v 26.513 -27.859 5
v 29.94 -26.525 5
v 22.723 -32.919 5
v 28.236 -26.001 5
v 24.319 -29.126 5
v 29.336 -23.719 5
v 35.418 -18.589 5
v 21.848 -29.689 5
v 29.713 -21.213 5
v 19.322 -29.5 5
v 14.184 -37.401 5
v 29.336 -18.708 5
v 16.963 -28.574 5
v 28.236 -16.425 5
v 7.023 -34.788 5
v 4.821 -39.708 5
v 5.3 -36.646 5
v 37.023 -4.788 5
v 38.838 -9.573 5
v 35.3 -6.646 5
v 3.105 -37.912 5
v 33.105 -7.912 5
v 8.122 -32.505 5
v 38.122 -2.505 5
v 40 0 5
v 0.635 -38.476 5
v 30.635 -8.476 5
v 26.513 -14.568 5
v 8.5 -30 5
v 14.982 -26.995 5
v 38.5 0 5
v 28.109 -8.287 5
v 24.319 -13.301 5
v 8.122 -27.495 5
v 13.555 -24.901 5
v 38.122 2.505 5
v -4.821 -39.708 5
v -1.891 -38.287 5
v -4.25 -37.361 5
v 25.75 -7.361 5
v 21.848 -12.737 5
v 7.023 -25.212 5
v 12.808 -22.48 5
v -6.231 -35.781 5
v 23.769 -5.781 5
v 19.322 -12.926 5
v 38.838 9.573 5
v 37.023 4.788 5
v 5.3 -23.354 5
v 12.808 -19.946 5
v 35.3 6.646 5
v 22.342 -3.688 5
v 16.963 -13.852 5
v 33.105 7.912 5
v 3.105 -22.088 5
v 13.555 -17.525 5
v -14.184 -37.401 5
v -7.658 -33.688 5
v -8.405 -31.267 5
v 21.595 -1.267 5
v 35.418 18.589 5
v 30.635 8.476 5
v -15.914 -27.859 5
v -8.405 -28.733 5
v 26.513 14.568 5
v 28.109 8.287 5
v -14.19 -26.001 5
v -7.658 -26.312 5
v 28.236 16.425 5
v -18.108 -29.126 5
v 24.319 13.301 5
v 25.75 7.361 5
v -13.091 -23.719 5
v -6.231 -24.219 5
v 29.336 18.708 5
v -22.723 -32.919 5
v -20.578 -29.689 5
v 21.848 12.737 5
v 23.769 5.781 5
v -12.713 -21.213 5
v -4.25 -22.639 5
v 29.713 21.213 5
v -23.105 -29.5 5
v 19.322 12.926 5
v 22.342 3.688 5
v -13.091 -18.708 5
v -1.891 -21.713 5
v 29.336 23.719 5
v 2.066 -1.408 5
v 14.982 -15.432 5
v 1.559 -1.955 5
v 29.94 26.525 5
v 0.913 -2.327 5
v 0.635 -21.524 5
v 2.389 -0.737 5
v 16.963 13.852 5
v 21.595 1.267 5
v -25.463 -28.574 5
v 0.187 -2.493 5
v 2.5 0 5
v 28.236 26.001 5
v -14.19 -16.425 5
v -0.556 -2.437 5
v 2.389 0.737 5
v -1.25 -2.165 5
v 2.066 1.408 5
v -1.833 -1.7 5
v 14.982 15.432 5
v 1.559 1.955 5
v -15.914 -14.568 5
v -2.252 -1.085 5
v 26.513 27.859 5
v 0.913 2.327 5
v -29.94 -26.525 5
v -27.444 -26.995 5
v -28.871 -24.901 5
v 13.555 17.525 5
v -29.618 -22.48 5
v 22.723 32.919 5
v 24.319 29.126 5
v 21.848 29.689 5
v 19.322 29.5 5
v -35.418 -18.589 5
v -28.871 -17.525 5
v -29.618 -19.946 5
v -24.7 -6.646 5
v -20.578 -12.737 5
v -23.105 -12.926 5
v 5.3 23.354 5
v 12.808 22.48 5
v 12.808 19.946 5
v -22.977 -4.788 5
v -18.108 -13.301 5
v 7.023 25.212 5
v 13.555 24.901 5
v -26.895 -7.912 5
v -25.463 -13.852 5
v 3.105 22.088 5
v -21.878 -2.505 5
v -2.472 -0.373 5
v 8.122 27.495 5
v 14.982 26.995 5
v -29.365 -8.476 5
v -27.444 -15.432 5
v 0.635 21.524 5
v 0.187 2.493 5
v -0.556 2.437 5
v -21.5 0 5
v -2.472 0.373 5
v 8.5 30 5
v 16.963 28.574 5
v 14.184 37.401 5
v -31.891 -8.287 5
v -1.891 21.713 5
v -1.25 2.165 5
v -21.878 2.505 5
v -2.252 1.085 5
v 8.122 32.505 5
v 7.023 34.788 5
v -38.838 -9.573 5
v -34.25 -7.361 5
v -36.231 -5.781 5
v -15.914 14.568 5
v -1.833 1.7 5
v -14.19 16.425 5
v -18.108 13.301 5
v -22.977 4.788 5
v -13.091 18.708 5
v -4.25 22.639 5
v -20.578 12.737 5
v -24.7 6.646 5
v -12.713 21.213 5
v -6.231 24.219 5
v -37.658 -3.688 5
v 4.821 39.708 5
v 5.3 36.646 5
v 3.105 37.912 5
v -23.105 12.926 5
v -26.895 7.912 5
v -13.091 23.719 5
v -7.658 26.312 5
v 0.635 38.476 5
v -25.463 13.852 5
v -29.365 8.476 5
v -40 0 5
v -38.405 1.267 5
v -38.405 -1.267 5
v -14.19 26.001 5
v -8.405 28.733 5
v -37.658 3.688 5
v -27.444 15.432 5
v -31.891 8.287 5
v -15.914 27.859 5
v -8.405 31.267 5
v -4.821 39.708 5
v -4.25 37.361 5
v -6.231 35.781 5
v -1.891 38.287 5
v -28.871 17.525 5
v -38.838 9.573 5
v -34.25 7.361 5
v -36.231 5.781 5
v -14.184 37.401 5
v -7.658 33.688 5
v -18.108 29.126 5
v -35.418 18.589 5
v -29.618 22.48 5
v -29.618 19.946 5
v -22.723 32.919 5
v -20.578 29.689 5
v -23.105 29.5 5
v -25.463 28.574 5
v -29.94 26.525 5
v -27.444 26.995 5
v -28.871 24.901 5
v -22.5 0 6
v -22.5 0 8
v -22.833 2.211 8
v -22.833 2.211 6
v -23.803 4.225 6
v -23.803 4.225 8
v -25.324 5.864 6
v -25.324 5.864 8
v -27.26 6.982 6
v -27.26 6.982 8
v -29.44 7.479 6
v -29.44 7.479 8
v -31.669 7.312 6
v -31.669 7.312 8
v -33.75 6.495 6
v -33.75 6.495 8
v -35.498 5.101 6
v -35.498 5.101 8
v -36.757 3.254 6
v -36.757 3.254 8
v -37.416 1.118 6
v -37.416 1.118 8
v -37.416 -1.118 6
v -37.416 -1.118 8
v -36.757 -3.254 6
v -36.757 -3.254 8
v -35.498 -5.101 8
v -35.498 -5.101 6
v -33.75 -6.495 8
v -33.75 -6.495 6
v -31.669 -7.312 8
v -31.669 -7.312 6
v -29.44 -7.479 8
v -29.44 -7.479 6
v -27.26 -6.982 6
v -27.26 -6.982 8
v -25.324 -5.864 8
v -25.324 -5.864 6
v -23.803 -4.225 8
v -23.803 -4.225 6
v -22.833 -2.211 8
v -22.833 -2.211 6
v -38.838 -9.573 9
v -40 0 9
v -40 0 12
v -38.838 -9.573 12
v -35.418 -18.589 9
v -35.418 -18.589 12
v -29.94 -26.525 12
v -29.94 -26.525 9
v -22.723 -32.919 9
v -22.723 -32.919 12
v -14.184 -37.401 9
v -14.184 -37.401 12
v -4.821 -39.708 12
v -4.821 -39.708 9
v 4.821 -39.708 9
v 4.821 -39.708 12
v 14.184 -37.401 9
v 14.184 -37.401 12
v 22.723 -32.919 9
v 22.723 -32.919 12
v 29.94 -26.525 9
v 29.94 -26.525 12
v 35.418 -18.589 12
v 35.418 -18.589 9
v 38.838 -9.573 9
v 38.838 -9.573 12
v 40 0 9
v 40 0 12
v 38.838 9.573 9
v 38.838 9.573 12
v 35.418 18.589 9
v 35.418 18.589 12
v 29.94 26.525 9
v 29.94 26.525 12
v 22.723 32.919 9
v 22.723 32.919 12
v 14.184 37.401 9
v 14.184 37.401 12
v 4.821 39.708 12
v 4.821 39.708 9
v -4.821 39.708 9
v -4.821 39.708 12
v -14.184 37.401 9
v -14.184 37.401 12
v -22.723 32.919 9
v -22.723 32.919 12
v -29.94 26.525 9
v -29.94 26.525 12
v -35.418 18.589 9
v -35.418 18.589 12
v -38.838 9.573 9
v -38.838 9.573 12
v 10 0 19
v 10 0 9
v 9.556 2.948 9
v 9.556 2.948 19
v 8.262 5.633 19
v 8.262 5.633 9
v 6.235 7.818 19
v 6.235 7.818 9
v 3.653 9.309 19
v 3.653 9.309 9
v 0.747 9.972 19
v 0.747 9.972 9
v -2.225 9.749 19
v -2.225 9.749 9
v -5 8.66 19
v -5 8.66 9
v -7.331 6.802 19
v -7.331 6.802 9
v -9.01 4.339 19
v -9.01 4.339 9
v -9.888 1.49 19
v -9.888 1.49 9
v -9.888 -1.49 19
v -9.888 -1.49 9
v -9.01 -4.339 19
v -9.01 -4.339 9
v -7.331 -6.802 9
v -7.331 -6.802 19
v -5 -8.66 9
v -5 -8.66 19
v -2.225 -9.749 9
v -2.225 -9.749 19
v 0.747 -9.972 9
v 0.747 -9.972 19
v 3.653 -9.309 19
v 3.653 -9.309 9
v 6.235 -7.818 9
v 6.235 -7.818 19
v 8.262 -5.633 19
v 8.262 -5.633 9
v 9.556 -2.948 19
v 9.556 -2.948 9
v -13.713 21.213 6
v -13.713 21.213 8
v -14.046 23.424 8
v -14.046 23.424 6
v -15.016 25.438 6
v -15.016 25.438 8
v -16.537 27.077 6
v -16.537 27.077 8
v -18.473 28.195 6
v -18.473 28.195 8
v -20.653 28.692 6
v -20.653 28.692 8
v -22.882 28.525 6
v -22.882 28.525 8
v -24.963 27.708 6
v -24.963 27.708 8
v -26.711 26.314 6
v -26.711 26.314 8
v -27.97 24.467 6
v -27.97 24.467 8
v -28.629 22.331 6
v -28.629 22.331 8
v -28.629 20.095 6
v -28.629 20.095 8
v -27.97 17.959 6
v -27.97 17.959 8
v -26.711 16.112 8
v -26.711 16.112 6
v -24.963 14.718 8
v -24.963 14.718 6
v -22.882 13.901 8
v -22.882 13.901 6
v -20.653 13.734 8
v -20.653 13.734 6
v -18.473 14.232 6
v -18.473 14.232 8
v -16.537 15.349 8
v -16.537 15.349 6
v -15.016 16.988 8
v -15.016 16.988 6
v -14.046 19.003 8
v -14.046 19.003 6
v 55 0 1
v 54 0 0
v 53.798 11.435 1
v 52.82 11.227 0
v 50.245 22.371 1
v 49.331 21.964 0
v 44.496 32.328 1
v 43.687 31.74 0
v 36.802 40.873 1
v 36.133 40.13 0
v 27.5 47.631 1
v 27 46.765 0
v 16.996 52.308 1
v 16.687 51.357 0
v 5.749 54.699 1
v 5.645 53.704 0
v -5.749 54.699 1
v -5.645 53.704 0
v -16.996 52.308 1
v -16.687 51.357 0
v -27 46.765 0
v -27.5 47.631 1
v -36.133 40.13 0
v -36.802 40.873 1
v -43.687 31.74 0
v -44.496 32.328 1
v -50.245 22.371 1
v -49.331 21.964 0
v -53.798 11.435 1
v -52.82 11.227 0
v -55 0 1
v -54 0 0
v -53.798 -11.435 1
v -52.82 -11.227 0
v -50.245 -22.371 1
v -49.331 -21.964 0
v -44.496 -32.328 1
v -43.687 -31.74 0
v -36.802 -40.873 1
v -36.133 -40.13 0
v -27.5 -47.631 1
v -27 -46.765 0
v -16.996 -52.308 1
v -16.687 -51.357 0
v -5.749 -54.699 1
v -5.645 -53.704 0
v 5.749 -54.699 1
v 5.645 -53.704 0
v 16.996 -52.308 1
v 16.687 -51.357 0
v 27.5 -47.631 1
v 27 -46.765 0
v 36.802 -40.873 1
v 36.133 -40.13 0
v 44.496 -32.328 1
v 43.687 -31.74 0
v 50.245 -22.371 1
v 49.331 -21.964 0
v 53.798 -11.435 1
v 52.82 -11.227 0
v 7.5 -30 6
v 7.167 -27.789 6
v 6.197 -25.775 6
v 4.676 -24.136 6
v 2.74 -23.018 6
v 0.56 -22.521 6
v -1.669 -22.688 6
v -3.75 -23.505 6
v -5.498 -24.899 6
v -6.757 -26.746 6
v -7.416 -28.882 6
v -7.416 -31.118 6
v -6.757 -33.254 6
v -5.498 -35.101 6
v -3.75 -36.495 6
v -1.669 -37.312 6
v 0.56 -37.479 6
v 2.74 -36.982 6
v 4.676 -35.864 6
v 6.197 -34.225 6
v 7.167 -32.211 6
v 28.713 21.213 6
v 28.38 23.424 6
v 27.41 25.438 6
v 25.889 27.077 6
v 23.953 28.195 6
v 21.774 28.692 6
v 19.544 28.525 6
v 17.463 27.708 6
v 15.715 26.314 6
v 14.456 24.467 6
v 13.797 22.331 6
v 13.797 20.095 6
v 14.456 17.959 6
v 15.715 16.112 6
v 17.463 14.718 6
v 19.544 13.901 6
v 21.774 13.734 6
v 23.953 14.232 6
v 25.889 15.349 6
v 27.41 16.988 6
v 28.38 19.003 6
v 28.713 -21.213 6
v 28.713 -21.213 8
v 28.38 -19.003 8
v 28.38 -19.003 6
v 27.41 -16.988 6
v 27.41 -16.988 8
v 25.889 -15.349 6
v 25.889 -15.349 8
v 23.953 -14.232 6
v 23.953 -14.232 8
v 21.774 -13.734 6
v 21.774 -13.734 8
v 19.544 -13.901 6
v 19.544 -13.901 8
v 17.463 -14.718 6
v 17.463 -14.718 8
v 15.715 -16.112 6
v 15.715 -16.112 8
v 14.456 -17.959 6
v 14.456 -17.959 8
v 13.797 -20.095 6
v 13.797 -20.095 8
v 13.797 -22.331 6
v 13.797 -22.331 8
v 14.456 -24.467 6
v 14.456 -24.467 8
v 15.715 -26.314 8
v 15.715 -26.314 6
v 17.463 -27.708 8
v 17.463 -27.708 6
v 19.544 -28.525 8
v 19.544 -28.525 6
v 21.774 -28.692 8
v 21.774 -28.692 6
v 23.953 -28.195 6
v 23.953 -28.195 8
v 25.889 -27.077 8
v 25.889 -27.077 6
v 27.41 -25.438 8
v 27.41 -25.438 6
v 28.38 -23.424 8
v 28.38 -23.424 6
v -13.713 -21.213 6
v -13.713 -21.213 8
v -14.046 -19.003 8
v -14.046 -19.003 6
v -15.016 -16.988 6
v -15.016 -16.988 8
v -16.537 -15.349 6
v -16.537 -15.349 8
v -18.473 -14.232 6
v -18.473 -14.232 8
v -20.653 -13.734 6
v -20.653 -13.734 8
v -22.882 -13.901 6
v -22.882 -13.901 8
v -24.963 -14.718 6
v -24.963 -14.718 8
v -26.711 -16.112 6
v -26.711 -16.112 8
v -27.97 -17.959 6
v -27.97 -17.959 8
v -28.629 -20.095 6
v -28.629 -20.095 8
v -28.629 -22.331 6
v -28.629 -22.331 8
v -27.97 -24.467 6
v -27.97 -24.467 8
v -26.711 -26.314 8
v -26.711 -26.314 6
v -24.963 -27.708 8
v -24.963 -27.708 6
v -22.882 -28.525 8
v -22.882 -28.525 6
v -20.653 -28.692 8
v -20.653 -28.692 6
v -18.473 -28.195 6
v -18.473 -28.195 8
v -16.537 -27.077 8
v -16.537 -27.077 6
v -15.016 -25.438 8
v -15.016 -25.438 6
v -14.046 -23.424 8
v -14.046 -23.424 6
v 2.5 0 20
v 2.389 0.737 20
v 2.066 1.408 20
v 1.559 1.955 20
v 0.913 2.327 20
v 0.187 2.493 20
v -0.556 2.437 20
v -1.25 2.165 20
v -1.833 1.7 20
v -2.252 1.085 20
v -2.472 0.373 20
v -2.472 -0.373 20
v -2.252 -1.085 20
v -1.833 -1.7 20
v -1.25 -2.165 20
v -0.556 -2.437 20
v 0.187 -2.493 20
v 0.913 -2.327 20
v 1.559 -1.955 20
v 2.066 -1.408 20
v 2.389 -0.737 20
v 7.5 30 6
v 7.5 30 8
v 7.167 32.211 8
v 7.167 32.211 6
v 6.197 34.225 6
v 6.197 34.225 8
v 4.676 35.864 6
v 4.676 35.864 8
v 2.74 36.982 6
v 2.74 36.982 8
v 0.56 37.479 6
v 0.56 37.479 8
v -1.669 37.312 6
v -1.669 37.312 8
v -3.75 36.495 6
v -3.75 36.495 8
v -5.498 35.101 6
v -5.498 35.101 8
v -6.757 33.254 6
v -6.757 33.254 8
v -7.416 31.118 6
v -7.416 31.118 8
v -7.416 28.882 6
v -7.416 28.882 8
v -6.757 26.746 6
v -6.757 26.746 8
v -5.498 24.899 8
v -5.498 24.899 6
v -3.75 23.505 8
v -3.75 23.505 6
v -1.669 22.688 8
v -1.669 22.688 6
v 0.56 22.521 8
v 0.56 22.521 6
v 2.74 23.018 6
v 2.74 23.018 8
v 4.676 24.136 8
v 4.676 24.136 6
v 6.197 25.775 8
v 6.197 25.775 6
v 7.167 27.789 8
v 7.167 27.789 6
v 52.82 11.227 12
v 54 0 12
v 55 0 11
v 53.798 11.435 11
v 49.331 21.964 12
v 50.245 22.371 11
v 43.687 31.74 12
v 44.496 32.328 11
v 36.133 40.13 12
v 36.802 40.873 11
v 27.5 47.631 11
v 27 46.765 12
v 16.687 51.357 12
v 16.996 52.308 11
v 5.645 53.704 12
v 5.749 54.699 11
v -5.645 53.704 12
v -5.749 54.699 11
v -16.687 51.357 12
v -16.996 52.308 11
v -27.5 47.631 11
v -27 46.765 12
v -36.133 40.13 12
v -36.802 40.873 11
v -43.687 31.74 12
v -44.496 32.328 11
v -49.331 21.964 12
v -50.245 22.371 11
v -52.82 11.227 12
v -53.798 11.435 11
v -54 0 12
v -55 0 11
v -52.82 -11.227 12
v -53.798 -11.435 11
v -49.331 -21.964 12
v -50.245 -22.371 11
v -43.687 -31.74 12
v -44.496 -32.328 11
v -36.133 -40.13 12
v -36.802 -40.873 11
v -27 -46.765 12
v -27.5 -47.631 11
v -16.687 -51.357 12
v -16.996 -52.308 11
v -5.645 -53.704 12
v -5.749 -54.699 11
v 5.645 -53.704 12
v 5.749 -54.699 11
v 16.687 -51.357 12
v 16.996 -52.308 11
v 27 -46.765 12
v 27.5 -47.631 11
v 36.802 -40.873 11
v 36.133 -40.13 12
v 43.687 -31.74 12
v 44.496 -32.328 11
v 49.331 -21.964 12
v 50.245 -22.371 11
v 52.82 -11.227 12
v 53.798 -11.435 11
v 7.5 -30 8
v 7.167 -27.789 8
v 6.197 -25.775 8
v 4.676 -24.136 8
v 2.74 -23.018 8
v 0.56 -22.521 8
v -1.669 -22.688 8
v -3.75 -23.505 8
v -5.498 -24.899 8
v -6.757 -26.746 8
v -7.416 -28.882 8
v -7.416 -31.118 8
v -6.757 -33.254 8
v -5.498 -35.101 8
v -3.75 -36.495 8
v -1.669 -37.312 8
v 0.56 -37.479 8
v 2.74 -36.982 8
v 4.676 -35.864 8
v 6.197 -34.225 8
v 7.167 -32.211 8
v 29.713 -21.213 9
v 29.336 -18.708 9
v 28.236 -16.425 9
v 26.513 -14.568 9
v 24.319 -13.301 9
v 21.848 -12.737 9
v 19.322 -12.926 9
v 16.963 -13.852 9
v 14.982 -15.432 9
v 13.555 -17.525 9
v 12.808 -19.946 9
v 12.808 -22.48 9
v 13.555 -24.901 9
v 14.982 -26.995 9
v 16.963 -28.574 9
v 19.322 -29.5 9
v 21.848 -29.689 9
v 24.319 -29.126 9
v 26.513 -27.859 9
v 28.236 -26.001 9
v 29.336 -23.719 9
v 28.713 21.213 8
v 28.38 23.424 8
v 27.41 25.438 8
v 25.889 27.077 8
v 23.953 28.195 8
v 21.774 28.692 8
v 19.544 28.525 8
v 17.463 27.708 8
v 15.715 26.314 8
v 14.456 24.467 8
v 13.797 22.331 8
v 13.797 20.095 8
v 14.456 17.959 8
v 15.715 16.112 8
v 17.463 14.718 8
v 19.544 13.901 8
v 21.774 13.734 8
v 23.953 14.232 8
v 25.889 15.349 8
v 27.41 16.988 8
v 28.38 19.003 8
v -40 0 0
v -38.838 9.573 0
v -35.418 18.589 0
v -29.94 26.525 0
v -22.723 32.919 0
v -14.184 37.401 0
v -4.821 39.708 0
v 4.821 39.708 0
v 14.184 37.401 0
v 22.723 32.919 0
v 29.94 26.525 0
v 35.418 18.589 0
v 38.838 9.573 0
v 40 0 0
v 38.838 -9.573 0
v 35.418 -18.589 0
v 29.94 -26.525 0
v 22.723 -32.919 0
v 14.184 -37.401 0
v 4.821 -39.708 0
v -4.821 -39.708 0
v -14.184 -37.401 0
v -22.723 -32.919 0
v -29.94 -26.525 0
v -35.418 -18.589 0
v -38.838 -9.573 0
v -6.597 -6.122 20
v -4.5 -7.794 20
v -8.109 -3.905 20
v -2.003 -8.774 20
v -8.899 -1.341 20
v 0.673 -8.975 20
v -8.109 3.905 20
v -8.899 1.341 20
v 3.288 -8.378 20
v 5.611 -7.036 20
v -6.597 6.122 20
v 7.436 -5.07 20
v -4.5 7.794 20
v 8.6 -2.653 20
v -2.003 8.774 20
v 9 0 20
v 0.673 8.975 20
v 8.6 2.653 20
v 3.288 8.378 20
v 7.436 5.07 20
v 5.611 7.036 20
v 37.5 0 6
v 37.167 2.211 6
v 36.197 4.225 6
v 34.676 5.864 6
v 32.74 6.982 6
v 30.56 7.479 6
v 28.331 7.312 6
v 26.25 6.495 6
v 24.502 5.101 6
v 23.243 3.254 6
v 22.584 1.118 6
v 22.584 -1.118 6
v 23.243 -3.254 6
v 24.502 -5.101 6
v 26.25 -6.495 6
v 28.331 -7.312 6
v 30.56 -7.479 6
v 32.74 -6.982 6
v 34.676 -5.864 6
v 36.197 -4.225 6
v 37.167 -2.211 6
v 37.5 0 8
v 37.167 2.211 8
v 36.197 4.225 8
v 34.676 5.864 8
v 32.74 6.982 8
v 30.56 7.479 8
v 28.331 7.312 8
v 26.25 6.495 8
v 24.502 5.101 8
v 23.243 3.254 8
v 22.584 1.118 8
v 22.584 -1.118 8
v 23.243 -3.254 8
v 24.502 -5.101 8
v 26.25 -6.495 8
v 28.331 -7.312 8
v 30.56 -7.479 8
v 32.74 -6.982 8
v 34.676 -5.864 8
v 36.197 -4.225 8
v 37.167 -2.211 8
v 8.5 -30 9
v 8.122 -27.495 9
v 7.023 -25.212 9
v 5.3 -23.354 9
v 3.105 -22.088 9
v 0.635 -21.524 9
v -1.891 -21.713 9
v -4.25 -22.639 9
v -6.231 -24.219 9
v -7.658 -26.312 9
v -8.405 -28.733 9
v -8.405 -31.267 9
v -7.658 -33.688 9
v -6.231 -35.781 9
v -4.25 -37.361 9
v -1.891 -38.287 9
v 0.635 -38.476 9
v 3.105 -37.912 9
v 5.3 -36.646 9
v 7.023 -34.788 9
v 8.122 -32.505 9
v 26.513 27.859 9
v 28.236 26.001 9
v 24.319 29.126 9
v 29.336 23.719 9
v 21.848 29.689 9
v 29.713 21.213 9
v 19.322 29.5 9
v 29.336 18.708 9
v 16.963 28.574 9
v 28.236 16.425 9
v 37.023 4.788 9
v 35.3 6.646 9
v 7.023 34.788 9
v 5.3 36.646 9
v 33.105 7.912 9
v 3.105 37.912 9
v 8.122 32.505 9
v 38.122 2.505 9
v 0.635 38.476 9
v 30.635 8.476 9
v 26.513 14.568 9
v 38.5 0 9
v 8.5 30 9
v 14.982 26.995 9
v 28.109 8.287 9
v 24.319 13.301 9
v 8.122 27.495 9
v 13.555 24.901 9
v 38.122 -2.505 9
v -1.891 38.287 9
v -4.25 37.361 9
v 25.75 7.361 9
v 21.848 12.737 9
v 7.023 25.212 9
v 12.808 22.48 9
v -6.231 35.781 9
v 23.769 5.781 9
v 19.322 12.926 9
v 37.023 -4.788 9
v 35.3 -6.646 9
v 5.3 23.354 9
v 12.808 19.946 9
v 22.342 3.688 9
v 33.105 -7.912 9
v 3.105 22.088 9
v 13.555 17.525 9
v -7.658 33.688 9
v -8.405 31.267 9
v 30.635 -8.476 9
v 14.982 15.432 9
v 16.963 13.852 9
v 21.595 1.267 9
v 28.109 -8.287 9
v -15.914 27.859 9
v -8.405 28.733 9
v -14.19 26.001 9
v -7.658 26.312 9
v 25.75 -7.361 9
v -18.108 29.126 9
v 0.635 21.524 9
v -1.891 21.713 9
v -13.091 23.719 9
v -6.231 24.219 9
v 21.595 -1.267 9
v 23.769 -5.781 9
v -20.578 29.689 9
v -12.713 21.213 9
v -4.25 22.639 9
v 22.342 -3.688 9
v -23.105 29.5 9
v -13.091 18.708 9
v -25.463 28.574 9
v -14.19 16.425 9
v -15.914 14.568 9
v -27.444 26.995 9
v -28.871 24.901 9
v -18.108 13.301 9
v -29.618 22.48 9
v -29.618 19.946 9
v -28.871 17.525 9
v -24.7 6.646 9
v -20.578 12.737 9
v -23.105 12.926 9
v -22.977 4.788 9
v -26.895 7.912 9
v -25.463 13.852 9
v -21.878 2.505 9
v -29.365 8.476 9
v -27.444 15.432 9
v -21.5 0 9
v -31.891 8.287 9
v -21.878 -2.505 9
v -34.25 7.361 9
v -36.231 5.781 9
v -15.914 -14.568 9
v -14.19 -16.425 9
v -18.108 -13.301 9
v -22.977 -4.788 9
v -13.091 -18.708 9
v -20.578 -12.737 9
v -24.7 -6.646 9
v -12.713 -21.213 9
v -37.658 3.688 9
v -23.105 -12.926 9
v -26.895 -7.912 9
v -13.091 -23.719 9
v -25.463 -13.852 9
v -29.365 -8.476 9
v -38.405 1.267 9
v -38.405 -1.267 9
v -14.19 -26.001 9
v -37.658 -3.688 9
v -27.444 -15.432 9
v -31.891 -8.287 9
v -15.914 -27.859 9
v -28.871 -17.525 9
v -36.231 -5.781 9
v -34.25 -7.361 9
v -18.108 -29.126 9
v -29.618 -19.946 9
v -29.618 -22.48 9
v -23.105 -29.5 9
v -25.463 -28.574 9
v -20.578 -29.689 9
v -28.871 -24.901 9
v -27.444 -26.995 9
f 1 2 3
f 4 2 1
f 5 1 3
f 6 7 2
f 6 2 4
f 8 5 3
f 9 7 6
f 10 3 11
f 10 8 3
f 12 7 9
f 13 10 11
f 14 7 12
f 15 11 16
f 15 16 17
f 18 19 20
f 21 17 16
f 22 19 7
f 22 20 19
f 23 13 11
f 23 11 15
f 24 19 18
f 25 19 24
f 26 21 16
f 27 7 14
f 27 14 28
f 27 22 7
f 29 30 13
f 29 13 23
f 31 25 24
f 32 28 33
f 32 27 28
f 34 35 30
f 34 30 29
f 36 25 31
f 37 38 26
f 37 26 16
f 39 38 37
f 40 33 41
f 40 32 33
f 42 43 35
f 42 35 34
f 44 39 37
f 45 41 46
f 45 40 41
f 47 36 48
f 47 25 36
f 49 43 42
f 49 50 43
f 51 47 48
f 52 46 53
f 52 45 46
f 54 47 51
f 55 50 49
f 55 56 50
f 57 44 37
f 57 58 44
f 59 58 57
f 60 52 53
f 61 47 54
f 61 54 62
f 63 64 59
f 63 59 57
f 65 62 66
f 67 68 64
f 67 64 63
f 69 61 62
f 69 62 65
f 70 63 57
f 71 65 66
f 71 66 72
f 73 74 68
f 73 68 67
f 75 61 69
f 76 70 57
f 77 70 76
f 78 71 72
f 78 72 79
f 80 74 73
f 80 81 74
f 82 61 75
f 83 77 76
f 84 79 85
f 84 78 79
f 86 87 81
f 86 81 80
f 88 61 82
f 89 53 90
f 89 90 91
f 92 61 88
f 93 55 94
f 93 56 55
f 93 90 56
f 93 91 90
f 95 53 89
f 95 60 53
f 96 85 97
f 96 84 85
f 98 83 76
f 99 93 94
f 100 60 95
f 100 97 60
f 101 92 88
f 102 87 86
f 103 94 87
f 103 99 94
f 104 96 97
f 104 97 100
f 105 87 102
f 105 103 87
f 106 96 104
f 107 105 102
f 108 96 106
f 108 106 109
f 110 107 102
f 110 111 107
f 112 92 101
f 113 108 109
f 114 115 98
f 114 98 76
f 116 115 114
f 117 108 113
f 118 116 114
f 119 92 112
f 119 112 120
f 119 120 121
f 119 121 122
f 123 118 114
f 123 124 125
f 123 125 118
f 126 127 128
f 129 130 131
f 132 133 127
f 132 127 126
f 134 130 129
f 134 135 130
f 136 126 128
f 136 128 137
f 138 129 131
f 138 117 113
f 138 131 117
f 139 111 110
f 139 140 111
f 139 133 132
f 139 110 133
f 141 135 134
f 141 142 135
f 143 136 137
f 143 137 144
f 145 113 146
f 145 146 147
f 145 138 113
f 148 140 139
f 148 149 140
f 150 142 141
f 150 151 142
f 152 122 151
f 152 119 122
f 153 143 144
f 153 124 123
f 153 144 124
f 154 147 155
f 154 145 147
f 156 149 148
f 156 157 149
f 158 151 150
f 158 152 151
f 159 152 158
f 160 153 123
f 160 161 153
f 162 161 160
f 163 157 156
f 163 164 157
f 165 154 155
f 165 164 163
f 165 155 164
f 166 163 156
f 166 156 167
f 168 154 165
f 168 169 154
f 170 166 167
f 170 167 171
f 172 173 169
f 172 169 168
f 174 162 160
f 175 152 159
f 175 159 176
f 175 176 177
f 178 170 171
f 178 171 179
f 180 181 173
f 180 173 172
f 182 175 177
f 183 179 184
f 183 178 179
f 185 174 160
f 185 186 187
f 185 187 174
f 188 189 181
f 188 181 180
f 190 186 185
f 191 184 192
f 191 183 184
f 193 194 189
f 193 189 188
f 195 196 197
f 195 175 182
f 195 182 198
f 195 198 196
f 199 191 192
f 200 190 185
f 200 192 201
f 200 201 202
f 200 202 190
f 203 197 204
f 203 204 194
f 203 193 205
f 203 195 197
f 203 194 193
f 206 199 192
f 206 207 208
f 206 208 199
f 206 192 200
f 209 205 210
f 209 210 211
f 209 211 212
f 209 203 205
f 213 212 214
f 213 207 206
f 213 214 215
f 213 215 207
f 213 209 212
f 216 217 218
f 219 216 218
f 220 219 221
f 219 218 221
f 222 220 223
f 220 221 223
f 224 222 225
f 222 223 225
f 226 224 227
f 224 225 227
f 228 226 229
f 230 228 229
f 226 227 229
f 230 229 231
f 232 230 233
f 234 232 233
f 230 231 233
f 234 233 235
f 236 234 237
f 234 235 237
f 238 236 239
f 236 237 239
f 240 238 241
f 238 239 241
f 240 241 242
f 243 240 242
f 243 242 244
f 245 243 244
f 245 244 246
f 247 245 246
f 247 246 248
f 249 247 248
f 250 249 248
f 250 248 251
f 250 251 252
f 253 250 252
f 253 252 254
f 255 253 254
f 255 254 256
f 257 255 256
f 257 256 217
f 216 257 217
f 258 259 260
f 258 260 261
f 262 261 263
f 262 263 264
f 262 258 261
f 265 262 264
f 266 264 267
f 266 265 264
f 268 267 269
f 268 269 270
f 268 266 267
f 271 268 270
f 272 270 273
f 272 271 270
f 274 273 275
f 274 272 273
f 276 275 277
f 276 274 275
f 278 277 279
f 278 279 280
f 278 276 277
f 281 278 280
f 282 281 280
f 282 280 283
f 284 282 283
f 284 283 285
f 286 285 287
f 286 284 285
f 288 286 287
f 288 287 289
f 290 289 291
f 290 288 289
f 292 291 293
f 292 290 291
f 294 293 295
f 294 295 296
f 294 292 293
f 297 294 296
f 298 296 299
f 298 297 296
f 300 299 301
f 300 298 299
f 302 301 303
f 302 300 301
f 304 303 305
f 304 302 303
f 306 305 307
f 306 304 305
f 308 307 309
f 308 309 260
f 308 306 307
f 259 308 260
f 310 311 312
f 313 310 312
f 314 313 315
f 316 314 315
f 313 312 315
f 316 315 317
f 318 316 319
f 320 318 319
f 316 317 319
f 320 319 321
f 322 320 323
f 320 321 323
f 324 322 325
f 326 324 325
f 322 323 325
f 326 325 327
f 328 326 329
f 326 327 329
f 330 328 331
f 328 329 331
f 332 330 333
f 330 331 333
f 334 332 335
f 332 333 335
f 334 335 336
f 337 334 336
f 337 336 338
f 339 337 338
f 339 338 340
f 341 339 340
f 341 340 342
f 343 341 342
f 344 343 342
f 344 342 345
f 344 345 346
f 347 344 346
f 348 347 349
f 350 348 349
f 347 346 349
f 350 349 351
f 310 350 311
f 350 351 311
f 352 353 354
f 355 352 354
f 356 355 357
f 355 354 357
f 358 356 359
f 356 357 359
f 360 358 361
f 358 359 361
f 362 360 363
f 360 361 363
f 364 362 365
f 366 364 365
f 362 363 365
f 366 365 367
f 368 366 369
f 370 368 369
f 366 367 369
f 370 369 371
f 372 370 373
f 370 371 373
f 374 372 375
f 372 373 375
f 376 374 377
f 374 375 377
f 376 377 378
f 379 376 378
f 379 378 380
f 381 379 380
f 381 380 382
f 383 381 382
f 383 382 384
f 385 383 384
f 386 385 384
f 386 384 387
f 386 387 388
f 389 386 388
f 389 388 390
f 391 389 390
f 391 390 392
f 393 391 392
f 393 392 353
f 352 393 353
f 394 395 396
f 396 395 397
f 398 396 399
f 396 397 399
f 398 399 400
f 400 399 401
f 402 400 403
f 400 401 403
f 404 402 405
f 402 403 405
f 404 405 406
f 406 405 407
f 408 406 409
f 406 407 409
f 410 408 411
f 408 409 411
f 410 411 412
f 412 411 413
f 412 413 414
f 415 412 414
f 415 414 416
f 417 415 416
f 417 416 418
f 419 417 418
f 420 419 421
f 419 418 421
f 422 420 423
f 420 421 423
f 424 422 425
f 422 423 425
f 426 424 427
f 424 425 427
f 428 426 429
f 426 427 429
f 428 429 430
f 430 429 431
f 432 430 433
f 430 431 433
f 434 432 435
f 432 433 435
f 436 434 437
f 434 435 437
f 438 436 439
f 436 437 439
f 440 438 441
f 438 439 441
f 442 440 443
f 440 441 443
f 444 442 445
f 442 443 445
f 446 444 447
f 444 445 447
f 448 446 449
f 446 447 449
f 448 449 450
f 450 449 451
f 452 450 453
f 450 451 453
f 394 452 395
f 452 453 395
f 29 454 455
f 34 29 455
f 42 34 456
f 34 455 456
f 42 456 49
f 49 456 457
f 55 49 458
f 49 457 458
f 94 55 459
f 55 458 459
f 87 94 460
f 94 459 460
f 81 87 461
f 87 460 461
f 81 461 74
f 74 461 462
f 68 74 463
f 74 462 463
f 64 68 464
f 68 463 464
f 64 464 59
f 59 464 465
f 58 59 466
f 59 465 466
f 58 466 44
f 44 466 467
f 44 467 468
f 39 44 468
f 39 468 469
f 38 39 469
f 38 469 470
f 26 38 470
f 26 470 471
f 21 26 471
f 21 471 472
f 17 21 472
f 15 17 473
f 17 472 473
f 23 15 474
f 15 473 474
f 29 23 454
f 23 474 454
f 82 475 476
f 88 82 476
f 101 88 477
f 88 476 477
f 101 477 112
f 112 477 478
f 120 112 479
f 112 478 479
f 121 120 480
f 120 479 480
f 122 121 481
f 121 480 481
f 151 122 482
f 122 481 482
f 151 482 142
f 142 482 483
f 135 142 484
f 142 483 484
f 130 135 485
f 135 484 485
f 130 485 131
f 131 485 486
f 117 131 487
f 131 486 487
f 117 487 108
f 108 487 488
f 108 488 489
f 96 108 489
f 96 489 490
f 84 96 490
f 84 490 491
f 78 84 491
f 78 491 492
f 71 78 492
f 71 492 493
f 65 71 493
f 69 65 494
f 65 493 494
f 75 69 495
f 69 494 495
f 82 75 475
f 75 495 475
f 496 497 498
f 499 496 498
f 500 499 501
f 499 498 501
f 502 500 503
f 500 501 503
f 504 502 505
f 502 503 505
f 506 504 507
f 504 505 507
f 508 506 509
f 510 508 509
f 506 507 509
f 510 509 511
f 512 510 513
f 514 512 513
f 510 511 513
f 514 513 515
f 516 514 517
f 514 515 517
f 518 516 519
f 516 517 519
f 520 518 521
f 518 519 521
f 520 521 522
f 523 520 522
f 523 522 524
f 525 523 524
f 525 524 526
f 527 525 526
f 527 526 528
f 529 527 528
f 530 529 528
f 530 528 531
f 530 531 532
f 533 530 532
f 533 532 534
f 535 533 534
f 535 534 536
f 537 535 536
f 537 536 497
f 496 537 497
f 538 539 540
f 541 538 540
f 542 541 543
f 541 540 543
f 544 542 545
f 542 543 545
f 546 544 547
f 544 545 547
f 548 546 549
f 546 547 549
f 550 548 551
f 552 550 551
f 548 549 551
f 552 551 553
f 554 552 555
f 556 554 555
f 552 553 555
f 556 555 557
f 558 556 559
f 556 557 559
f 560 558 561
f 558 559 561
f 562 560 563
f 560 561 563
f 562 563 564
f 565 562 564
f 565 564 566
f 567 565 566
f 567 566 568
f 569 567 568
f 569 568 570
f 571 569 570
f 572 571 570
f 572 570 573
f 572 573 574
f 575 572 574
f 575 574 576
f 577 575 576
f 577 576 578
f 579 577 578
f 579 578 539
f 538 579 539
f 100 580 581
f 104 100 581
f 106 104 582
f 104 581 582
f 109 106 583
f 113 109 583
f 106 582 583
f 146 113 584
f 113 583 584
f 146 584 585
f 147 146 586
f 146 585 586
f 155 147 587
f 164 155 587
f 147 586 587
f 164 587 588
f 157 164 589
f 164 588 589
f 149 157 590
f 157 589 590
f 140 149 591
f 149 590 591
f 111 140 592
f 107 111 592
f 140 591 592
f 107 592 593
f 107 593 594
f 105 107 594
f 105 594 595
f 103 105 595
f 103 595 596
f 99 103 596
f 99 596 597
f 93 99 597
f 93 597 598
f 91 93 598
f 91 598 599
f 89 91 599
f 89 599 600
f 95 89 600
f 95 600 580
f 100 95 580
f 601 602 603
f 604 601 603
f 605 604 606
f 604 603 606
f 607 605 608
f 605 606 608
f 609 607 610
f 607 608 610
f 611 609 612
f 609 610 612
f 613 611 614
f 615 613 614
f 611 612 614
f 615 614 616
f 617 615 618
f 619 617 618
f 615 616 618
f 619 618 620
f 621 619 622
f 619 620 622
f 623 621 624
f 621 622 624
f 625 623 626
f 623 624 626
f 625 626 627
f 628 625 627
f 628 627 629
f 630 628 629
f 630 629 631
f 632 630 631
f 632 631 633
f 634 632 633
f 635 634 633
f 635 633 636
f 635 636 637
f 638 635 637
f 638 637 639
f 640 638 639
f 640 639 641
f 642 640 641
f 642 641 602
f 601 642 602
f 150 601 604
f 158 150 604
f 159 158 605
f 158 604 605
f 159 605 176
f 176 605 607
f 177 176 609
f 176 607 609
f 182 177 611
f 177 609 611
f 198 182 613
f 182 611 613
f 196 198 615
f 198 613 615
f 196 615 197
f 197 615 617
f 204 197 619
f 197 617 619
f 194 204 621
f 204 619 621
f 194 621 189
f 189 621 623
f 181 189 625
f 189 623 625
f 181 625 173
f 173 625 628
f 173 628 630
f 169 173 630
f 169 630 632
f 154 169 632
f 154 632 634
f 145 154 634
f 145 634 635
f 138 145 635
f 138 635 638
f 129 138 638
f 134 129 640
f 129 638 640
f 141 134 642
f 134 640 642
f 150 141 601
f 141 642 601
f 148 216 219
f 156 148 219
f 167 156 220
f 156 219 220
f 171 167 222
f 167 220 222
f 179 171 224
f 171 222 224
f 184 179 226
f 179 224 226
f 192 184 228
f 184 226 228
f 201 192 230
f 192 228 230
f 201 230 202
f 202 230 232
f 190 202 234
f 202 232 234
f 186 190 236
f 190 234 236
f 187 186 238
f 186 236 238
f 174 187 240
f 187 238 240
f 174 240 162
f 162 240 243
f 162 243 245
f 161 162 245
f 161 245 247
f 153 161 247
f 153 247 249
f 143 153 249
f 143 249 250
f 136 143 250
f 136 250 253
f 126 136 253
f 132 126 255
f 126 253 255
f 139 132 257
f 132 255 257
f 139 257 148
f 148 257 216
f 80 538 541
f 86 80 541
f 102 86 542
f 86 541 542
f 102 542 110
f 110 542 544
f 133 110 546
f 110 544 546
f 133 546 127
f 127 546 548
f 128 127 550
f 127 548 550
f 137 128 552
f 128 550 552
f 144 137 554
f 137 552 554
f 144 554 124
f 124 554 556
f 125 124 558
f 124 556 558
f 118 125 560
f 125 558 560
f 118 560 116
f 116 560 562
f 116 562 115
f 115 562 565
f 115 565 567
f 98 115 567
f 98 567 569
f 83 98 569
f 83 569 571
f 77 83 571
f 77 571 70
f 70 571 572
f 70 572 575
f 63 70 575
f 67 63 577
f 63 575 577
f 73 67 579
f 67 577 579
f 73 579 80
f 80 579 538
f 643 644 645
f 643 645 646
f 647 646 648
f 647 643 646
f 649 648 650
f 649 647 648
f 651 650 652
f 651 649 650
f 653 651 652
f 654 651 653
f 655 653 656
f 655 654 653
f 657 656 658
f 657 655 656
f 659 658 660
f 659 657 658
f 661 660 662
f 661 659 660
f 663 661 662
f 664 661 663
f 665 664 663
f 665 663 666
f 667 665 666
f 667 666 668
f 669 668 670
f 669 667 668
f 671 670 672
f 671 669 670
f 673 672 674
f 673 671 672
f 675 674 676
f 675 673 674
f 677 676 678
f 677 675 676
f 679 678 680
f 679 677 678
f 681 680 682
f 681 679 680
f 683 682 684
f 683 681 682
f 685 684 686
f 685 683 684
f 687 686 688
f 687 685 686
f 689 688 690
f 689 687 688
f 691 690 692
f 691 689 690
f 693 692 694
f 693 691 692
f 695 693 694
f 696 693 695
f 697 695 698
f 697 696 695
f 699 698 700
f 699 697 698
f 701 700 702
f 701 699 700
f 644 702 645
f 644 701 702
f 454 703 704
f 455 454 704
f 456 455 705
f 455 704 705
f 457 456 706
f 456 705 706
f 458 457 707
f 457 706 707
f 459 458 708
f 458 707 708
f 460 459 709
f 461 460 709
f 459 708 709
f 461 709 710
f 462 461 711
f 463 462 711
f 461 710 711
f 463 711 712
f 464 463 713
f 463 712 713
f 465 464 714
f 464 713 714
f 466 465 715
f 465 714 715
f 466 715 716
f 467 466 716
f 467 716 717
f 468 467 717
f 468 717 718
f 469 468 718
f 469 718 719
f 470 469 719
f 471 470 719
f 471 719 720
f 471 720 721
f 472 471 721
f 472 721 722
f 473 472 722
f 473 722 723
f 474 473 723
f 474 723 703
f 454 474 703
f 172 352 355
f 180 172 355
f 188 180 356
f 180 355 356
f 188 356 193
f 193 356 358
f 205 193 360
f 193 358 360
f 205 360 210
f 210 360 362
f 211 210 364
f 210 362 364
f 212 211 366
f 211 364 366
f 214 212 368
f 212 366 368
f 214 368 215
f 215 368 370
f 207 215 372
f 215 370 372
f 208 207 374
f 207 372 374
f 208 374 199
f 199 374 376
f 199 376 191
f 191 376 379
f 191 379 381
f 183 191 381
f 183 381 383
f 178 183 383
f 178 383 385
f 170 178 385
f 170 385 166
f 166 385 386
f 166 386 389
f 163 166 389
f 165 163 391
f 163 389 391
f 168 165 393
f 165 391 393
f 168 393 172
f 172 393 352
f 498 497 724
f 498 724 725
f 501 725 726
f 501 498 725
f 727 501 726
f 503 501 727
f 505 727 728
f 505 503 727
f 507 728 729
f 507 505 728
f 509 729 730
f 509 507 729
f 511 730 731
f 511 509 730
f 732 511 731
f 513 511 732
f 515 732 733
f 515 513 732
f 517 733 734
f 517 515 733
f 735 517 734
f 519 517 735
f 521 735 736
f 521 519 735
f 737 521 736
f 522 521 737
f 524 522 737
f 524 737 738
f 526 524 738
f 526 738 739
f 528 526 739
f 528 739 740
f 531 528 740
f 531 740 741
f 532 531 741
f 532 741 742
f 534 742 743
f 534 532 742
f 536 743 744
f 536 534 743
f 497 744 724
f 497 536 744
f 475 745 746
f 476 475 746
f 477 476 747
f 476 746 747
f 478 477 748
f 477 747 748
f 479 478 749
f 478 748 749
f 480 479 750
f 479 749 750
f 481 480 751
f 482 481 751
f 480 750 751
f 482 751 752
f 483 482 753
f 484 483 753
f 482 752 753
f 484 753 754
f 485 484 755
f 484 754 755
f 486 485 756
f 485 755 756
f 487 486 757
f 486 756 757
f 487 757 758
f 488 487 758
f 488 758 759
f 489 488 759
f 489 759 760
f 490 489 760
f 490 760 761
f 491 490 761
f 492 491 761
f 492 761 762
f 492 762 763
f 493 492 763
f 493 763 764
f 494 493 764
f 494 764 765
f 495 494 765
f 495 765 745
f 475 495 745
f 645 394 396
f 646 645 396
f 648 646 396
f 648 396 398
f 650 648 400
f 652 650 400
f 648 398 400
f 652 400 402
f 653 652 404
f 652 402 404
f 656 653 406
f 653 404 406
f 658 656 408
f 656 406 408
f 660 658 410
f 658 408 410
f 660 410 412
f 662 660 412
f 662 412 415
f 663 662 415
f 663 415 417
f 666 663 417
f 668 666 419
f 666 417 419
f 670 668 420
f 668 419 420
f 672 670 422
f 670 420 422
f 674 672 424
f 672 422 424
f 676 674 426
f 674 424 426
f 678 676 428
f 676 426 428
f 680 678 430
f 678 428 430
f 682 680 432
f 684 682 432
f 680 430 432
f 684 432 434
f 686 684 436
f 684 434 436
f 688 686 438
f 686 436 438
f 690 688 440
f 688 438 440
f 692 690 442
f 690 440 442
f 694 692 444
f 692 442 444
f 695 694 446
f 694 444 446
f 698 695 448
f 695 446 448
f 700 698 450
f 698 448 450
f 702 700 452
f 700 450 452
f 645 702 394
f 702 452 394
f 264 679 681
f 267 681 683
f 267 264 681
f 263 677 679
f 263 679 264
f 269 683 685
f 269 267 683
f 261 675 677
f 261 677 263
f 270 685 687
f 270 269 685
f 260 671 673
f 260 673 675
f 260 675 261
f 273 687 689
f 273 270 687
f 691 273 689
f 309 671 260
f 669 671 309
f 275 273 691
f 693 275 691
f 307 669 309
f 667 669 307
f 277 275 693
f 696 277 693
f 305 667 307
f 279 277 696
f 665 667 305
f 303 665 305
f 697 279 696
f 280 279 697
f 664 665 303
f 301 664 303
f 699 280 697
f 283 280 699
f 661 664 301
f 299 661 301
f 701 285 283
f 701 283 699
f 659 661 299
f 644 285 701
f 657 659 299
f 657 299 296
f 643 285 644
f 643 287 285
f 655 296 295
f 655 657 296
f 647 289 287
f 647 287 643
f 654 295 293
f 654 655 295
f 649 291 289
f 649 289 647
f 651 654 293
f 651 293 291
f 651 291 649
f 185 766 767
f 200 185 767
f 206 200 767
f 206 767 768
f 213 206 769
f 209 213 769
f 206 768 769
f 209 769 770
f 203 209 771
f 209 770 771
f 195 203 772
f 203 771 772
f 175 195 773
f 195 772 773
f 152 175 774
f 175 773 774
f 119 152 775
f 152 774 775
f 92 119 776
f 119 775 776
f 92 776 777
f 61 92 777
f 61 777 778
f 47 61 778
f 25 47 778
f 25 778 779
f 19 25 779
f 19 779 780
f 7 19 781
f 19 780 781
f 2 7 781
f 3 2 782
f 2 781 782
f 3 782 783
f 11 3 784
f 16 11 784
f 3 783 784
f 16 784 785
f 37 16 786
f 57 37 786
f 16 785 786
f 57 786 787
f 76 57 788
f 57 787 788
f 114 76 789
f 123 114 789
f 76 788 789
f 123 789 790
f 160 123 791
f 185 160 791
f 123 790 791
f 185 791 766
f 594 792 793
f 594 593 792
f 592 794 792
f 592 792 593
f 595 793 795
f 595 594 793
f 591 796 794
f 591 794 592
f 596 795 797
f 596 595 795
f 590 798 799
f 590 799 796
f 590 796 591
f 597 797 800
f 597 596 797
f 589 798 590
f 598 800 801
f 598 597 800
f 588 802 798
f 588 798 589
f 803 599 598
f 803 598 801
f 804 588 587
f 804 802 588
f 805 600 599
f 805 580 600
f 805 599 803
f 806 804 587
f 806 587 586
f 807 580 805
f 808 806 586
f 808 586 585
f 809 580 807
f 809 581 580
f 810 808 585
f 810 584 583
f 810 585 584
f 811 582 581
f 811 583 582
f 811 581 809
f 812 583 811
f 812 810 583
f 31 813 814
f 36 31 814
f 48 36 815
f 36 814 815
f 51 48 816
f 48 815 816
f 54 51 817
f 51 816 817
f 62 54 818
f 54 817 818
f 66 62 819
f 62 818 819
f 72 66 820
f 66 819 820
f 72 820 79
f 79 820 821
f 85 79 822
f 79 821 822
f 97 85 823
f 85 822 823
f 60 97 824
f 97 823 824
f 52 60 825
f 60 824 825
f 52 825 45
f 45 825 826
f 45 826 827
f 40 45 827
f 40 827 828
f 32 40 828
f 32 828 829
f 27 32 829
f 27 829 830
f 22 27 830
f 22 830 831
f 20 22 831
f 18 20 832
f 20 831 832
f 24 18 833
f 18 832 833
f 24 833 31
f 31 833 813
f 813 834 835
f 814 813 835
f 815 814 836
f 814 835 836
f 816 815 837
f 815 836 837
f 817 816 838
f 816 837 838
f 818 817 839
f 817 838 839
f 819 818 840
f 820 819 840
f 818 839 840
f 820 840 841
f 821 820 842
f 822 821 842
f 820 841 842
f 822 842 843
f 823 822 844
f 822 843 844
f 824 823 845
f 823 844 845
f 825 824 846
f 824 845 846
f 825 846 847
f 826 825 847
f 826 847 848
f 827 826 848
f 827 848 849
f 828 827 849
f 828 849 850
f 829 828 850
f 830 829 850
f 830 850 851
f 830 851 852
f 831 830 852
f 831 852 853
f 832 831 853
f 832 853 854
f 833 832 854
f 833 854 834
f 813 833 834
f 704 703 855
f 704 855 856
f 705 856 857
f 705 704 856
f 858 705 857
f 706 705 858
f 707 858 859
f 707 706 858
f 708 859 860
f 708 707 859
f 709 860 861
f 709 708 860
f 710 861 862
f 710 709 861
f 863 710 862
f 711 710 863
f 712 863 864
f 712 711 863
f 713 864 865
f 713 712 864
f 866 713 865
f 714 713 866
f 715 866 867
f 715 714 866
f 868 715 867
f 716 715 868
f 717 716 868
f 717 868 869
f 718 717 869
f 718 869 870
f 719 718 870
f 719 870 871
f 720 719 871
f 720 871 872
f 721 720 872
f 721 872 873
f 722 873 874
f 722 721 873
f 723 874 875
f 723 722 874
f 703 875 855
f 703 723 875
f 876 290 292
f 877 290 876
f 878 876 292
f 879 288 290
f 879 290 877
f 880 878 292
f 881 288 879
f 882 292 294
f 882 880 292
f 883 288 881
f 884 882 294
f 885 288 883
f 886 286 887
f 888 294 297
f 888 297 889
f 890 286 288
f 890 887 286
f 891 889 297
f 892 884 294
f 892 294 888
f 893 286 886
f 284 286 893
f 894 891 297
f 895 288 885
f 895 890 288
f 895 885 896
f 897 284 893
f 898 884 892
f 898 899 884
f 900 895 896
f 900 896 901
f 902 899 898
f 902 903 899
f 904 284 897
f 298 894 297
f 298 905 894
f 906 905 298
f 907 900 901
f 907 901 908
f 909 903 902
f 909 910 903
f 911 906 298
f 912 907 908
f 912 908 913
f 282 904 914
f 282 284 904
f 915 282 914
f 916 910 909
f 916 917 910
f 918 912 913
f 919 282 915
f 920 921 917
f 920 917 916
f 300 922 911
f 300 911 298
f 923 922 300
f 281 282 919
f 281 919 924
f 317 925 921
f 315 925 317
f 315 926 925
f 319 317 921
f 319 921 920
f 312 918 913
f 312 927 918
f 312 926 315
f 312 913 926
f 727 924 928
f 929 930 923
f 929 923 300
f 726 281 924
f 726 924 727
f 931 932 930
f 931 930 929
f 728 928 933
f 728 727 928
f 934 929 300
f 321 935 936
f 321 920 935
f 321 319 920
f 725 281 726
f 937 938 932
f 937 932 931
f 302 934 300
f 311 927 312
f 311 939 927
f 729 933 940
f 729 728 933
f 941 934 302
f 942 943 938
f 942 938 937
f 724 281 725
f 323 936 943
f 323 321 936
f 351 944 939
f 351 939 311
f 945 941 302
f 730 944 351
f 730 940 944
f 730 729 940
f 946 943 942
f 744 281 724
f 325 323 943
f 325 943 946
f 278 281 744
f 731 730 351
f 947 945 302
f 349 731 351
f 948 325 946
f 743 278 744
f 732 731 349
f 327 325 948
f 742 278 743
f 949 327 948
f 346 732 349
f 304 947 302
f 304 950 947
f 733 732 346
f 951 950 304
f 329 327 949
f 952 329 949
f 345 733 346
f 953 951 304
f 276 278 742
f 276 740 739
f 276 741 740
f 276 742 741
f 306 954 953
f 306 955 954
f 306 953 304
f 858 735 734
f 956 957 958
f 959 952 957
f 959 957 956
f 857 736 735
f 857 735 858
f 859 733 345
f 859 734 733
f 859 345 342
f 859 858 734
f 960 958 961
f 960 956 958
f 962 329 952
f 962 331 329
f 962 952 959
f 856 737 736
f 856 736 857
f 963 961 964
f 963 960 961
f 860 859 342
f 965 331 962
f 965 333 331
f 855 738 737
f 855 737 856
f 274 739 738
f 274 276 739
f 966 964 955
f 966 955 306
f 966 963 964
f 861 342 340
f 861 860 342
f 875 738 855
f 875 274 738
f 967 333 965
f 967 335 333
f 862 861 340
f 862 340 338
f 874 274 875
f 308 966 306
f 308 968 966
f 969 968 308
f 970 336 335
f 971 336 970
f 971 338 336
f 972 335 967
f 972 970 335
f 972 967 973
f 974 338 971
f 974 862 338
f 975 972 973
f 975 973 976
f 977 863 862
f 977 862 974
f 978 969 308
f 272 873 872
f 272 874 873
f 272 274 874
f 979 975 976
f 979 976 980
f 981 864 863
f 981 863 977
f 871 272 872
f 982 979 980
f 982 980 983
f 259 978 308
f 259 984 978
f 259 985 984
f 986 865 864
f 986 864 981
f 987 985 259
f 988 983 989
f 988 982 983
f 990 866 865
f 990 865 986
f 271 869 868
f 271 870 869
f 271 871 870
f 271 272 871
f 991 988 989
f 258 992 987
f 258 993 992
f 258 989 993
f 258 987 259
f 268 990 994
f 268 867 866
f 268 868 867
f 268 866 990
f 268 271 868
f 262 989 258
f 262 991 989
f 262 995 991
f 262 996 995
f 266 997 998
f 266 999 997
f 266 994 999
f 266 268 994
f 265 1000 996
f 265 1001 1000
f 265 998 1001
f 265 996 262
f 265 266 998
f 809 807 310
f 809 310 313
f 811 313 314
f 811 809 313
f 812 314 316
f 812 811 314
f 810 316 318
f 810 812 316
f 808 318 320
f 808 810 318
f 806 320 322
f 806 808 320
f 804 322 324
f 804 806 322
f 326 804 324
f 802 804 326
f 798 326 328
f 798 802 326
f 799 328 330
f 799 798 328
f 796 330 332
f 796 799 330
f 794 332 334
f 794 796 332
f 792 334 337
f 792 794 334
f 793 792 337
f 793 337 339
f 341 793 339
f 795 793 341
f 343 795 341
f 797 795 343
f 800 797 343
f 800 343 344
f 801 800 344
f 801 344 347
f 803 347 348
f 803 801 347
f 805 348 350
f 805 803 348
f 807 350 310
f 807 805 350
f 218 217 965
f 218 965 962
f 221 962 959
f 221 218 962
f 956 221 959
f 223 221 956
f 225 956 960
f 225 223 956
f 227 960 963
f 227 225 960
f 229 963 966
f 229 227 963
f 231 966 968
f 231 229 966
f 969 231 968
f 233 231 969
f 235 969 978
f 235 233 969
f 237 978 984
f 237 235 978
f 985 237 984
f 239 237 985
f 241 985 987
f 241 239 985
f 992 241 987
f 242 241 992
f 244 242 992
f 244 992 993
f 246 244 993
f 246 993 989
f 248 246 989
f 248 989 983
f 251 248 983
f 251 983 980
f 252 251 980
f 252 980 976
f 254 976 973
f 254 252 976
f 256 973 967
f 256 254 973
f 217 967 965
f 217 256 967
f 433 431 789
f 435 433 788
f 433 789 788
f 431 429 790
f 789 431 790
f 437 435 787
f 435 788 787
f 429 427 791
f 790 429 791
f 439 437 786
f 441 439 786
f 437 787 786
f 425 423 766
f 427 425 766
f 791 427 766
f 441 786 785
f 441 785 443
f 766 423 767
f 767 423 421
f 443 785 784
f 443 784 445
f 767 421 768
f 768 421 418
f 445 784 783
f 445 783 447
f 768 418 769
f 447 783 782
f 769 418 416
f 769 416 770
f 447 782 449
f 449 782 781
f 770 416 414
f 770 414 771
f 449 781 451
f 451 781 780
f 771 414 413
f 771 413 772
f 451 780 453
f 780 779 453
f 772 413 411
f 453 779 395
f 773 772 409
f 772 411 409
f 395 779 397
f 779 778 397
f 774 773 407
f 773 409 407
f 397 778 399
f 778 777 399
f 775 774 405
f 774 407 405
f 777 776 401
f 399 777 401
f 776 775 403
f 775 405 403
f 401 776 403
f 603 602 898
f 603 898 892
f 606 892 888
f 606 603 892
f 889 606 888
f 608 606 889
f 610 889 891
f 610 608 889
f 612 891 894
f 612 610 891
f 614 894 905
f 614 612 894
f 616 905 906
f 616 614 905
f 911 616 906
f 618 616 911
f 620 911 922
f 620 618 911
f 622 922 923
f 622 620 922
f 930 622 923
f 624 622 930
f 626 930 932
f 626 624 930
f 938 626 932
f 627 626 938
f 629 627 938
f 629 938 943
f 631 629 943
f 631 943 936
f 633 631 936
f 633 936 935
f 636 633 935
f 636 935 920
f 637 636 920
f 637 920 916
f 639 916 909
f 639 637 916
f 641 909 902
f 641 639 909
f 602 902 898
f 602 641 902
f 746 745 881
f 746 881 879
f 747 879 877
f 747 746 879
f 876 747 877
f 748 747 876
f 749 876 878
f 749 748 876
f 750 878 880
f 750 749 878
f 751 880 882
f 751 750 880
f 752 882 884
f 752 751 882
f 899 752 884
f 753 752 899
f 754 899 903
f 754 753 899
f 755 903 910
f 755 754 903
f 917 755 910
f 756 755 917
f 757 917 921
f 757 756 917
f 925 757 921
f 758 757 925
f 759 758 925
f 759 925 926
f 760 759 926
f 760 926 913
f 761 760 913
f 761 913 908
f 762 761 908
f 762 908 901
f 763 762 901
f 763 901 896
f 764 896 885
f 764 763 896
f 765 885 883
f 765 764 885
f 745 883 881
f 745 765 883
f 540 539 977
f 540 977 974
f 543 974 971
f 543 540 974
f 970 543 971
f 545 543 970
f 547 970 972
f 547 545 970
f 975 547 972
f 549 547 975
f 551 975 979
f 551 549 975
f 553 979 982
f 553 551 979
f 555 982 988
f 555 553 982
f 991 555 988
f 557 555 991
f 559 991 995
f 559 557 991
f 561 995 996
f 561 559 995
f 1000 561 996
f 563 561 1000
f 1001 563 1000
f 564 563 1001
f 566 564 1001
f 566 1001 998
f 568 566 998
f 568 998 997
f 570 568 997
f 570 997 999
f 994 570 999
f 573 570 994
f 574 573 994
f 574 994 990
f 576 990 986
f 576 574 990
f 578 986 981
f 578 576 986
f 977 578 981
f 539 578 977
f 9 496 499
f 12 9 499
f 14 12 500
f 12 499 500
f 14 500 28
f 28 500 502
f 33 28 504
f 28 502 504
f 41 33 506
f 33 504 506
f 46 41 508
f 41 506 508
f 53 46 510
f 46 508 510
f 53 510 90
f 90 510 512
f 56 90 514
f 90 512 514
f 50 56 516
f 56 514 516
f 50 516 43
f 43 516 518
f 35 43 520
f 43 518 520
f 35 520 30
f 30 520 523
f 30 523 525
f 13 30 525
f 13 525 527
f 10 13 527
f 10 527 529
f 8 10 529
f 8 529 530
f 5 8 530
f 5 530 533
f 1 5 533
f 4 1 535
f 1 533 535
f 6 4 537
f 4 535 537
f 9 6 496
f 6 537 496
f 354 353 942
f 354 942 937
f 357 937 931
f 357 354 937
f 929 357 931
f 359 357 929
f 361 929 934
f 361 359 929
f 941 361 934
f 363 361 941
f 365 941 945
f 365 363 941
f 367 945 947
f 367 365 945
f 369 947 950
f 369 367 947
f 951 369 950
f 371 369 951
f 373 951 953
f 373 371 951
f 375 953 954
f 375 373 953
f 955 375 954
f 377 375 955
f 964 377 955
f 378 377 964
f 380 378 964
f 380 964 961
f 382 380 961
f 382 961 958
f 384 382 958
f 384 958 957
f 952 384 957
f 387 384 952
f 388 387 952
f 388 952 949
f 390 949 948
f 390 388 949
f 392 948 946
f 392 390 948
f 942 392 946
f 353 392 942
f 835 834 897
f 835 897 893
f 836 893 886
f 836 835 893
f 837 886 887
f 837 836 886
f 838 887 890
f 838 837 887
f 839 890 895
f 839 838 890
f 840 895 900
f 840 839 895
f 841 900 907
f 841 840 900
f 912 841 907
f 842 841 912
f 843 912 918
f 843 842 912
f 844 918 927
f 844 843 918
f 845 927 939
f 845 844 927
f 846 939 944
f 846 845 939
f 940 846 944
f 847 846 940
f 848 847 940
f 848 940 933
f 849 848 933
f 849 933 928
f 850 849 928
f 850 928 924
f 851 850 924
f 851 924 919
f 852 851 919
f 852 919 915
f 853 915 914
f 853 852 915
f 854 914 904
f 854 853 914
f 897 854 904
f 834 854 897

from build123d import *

# Parameters (mm, degrees)
SKETCH1_R           = 55
BOSS_EXTRUDE1_DEPTH = 12
SKETCH2_R           = 40
CUT_EXTRUDE1_DEPTH  = 5
CUT_EXTRUDE2_START  = -3
SKETCH3_R           = 40
CUT_EXTRUDE2_DEPTH  = 3
SKETCH4_R           = 10
BOSS_EXTRUDE2_DEPTH = 11
SKETCH5_R           = 2.5
CUT_EXTRUDE3_DEPTH  = 81.311892021
SKETCH6_R           = 7.5
CUT_EXTRUDE4_DEPTH  = 79.555712714
CHAMFER1_SIZE       = 1


with BuildPart() as part:
    # Sketch1 → Boss-Extrude1 (new body)
    with BuildSketch(Plane.XY):
        Circle(SKETCH1_R)
    extrude(amount=BOSS_EXTRUDE1_DEPTH)

    # Sketch2 → Cut-Extrude1 (cut)
    with BuildSketch(Plane(origin=(0, 0, 0), x_dir=(-1, 0, 0), z_dir=(0, 0, -1))):
        Circle(SKETCH2_R)
    extrude(amount=-CUT_EXTRUDE1_DEPTH, mode=Mode.SUBTRACT)

    # Sketch3 → Cut-Extrude2 (cut)
    with BuildSketch(Plane.XY.offset(12).offset(CUT_EXTRUDE2_START)):
        with Locations(Location((0, 0, 0), (0, 0, 180))):
            Circle(SKETCH3_R)
    extrude(amount=CUT_EXTRUDE2_DEPTH, mode=Mode.SUBTRACT)

    # Sketch4 → Boss-Extrude2 (add)
    with BuildSketch(Plane.XY.offset(9)):
        Circle(SKETCH4_R)
    extrude(amount=BOSS_EXTRUDE2_DEPTH)

    # Sketch5 → Cut-Extrude3 (cut, through all)
    with BuildSketch(Plane.XY.offset(20)):
        Circle(SKETCH5_R)
    extrude(amount=-CUT_EXTRUDE3_DEPTH, mode=Mode.SUBTRACT)

    # Sketch6 → Cut-Extrude4 (cut, through all)
    with BuildSketch(Plane.XY.offset(9)):
        with Locations((0, 30)):
            Circle(SKETCH6_R)
        with Locations((21.213203436, 21.213203436)):
            Circle(SKETCH6_R)
        with Locations((30, 0)):
            Circle(SKETCH6_R)
        with Locations((21.213203436, -21.213203436)):
            Circle(SKETCH6_R)
        with Locations((0, -30)):
            Circle(SKETCH6_R)
        with Locations((-21.213203436, -21.213203436)):
            Circle(SKETCH6_R)
        with Locations((-30, 0)):
            Circle(SKETCH6_R)
        with Locations((-21.213203436, 21.213203436)):
            Circle(SKETCH6_R)
    extrude(amount=-CUT_EXTRUDE4_DEPTH, mode=Mode.SUBTRACT)

    # Chamfer1
    chamfer1_edges = [part.edges().sort_by_distance(p)[0] for p in [
        (-10, 0, 20),
        (-55, 0, 0),
        (-28.713203436, 21.213203436, 5),
        (-28.713203436, 21.213203436, 9),
        (-37.5, 0, 5),
        (-37.5, 0, 9),
        (-28.713203436, -21.213203436, 5),
        (-28.713203436, -21.213203436, 9),
        (-7.5, -30, 5),
        (-7.5, -30, 9),
        (13.713203436, -21.213203436, 5),
        (13.713203436, -21.213203436, 9),
        (22.5, 0, 5),
        (22.5, 0, 9),
        (13.713203436, 21.213203436, 5),
        (13.713203436, 21.213203436, 9),
        (-7.5, 30, 5),
        (-7.5, 30, 9),
        (-55, 0, 12),
    ]]
    chamfer(chamfer1_edges, length=CHAMFER1_SIZE)


solid = part.part
